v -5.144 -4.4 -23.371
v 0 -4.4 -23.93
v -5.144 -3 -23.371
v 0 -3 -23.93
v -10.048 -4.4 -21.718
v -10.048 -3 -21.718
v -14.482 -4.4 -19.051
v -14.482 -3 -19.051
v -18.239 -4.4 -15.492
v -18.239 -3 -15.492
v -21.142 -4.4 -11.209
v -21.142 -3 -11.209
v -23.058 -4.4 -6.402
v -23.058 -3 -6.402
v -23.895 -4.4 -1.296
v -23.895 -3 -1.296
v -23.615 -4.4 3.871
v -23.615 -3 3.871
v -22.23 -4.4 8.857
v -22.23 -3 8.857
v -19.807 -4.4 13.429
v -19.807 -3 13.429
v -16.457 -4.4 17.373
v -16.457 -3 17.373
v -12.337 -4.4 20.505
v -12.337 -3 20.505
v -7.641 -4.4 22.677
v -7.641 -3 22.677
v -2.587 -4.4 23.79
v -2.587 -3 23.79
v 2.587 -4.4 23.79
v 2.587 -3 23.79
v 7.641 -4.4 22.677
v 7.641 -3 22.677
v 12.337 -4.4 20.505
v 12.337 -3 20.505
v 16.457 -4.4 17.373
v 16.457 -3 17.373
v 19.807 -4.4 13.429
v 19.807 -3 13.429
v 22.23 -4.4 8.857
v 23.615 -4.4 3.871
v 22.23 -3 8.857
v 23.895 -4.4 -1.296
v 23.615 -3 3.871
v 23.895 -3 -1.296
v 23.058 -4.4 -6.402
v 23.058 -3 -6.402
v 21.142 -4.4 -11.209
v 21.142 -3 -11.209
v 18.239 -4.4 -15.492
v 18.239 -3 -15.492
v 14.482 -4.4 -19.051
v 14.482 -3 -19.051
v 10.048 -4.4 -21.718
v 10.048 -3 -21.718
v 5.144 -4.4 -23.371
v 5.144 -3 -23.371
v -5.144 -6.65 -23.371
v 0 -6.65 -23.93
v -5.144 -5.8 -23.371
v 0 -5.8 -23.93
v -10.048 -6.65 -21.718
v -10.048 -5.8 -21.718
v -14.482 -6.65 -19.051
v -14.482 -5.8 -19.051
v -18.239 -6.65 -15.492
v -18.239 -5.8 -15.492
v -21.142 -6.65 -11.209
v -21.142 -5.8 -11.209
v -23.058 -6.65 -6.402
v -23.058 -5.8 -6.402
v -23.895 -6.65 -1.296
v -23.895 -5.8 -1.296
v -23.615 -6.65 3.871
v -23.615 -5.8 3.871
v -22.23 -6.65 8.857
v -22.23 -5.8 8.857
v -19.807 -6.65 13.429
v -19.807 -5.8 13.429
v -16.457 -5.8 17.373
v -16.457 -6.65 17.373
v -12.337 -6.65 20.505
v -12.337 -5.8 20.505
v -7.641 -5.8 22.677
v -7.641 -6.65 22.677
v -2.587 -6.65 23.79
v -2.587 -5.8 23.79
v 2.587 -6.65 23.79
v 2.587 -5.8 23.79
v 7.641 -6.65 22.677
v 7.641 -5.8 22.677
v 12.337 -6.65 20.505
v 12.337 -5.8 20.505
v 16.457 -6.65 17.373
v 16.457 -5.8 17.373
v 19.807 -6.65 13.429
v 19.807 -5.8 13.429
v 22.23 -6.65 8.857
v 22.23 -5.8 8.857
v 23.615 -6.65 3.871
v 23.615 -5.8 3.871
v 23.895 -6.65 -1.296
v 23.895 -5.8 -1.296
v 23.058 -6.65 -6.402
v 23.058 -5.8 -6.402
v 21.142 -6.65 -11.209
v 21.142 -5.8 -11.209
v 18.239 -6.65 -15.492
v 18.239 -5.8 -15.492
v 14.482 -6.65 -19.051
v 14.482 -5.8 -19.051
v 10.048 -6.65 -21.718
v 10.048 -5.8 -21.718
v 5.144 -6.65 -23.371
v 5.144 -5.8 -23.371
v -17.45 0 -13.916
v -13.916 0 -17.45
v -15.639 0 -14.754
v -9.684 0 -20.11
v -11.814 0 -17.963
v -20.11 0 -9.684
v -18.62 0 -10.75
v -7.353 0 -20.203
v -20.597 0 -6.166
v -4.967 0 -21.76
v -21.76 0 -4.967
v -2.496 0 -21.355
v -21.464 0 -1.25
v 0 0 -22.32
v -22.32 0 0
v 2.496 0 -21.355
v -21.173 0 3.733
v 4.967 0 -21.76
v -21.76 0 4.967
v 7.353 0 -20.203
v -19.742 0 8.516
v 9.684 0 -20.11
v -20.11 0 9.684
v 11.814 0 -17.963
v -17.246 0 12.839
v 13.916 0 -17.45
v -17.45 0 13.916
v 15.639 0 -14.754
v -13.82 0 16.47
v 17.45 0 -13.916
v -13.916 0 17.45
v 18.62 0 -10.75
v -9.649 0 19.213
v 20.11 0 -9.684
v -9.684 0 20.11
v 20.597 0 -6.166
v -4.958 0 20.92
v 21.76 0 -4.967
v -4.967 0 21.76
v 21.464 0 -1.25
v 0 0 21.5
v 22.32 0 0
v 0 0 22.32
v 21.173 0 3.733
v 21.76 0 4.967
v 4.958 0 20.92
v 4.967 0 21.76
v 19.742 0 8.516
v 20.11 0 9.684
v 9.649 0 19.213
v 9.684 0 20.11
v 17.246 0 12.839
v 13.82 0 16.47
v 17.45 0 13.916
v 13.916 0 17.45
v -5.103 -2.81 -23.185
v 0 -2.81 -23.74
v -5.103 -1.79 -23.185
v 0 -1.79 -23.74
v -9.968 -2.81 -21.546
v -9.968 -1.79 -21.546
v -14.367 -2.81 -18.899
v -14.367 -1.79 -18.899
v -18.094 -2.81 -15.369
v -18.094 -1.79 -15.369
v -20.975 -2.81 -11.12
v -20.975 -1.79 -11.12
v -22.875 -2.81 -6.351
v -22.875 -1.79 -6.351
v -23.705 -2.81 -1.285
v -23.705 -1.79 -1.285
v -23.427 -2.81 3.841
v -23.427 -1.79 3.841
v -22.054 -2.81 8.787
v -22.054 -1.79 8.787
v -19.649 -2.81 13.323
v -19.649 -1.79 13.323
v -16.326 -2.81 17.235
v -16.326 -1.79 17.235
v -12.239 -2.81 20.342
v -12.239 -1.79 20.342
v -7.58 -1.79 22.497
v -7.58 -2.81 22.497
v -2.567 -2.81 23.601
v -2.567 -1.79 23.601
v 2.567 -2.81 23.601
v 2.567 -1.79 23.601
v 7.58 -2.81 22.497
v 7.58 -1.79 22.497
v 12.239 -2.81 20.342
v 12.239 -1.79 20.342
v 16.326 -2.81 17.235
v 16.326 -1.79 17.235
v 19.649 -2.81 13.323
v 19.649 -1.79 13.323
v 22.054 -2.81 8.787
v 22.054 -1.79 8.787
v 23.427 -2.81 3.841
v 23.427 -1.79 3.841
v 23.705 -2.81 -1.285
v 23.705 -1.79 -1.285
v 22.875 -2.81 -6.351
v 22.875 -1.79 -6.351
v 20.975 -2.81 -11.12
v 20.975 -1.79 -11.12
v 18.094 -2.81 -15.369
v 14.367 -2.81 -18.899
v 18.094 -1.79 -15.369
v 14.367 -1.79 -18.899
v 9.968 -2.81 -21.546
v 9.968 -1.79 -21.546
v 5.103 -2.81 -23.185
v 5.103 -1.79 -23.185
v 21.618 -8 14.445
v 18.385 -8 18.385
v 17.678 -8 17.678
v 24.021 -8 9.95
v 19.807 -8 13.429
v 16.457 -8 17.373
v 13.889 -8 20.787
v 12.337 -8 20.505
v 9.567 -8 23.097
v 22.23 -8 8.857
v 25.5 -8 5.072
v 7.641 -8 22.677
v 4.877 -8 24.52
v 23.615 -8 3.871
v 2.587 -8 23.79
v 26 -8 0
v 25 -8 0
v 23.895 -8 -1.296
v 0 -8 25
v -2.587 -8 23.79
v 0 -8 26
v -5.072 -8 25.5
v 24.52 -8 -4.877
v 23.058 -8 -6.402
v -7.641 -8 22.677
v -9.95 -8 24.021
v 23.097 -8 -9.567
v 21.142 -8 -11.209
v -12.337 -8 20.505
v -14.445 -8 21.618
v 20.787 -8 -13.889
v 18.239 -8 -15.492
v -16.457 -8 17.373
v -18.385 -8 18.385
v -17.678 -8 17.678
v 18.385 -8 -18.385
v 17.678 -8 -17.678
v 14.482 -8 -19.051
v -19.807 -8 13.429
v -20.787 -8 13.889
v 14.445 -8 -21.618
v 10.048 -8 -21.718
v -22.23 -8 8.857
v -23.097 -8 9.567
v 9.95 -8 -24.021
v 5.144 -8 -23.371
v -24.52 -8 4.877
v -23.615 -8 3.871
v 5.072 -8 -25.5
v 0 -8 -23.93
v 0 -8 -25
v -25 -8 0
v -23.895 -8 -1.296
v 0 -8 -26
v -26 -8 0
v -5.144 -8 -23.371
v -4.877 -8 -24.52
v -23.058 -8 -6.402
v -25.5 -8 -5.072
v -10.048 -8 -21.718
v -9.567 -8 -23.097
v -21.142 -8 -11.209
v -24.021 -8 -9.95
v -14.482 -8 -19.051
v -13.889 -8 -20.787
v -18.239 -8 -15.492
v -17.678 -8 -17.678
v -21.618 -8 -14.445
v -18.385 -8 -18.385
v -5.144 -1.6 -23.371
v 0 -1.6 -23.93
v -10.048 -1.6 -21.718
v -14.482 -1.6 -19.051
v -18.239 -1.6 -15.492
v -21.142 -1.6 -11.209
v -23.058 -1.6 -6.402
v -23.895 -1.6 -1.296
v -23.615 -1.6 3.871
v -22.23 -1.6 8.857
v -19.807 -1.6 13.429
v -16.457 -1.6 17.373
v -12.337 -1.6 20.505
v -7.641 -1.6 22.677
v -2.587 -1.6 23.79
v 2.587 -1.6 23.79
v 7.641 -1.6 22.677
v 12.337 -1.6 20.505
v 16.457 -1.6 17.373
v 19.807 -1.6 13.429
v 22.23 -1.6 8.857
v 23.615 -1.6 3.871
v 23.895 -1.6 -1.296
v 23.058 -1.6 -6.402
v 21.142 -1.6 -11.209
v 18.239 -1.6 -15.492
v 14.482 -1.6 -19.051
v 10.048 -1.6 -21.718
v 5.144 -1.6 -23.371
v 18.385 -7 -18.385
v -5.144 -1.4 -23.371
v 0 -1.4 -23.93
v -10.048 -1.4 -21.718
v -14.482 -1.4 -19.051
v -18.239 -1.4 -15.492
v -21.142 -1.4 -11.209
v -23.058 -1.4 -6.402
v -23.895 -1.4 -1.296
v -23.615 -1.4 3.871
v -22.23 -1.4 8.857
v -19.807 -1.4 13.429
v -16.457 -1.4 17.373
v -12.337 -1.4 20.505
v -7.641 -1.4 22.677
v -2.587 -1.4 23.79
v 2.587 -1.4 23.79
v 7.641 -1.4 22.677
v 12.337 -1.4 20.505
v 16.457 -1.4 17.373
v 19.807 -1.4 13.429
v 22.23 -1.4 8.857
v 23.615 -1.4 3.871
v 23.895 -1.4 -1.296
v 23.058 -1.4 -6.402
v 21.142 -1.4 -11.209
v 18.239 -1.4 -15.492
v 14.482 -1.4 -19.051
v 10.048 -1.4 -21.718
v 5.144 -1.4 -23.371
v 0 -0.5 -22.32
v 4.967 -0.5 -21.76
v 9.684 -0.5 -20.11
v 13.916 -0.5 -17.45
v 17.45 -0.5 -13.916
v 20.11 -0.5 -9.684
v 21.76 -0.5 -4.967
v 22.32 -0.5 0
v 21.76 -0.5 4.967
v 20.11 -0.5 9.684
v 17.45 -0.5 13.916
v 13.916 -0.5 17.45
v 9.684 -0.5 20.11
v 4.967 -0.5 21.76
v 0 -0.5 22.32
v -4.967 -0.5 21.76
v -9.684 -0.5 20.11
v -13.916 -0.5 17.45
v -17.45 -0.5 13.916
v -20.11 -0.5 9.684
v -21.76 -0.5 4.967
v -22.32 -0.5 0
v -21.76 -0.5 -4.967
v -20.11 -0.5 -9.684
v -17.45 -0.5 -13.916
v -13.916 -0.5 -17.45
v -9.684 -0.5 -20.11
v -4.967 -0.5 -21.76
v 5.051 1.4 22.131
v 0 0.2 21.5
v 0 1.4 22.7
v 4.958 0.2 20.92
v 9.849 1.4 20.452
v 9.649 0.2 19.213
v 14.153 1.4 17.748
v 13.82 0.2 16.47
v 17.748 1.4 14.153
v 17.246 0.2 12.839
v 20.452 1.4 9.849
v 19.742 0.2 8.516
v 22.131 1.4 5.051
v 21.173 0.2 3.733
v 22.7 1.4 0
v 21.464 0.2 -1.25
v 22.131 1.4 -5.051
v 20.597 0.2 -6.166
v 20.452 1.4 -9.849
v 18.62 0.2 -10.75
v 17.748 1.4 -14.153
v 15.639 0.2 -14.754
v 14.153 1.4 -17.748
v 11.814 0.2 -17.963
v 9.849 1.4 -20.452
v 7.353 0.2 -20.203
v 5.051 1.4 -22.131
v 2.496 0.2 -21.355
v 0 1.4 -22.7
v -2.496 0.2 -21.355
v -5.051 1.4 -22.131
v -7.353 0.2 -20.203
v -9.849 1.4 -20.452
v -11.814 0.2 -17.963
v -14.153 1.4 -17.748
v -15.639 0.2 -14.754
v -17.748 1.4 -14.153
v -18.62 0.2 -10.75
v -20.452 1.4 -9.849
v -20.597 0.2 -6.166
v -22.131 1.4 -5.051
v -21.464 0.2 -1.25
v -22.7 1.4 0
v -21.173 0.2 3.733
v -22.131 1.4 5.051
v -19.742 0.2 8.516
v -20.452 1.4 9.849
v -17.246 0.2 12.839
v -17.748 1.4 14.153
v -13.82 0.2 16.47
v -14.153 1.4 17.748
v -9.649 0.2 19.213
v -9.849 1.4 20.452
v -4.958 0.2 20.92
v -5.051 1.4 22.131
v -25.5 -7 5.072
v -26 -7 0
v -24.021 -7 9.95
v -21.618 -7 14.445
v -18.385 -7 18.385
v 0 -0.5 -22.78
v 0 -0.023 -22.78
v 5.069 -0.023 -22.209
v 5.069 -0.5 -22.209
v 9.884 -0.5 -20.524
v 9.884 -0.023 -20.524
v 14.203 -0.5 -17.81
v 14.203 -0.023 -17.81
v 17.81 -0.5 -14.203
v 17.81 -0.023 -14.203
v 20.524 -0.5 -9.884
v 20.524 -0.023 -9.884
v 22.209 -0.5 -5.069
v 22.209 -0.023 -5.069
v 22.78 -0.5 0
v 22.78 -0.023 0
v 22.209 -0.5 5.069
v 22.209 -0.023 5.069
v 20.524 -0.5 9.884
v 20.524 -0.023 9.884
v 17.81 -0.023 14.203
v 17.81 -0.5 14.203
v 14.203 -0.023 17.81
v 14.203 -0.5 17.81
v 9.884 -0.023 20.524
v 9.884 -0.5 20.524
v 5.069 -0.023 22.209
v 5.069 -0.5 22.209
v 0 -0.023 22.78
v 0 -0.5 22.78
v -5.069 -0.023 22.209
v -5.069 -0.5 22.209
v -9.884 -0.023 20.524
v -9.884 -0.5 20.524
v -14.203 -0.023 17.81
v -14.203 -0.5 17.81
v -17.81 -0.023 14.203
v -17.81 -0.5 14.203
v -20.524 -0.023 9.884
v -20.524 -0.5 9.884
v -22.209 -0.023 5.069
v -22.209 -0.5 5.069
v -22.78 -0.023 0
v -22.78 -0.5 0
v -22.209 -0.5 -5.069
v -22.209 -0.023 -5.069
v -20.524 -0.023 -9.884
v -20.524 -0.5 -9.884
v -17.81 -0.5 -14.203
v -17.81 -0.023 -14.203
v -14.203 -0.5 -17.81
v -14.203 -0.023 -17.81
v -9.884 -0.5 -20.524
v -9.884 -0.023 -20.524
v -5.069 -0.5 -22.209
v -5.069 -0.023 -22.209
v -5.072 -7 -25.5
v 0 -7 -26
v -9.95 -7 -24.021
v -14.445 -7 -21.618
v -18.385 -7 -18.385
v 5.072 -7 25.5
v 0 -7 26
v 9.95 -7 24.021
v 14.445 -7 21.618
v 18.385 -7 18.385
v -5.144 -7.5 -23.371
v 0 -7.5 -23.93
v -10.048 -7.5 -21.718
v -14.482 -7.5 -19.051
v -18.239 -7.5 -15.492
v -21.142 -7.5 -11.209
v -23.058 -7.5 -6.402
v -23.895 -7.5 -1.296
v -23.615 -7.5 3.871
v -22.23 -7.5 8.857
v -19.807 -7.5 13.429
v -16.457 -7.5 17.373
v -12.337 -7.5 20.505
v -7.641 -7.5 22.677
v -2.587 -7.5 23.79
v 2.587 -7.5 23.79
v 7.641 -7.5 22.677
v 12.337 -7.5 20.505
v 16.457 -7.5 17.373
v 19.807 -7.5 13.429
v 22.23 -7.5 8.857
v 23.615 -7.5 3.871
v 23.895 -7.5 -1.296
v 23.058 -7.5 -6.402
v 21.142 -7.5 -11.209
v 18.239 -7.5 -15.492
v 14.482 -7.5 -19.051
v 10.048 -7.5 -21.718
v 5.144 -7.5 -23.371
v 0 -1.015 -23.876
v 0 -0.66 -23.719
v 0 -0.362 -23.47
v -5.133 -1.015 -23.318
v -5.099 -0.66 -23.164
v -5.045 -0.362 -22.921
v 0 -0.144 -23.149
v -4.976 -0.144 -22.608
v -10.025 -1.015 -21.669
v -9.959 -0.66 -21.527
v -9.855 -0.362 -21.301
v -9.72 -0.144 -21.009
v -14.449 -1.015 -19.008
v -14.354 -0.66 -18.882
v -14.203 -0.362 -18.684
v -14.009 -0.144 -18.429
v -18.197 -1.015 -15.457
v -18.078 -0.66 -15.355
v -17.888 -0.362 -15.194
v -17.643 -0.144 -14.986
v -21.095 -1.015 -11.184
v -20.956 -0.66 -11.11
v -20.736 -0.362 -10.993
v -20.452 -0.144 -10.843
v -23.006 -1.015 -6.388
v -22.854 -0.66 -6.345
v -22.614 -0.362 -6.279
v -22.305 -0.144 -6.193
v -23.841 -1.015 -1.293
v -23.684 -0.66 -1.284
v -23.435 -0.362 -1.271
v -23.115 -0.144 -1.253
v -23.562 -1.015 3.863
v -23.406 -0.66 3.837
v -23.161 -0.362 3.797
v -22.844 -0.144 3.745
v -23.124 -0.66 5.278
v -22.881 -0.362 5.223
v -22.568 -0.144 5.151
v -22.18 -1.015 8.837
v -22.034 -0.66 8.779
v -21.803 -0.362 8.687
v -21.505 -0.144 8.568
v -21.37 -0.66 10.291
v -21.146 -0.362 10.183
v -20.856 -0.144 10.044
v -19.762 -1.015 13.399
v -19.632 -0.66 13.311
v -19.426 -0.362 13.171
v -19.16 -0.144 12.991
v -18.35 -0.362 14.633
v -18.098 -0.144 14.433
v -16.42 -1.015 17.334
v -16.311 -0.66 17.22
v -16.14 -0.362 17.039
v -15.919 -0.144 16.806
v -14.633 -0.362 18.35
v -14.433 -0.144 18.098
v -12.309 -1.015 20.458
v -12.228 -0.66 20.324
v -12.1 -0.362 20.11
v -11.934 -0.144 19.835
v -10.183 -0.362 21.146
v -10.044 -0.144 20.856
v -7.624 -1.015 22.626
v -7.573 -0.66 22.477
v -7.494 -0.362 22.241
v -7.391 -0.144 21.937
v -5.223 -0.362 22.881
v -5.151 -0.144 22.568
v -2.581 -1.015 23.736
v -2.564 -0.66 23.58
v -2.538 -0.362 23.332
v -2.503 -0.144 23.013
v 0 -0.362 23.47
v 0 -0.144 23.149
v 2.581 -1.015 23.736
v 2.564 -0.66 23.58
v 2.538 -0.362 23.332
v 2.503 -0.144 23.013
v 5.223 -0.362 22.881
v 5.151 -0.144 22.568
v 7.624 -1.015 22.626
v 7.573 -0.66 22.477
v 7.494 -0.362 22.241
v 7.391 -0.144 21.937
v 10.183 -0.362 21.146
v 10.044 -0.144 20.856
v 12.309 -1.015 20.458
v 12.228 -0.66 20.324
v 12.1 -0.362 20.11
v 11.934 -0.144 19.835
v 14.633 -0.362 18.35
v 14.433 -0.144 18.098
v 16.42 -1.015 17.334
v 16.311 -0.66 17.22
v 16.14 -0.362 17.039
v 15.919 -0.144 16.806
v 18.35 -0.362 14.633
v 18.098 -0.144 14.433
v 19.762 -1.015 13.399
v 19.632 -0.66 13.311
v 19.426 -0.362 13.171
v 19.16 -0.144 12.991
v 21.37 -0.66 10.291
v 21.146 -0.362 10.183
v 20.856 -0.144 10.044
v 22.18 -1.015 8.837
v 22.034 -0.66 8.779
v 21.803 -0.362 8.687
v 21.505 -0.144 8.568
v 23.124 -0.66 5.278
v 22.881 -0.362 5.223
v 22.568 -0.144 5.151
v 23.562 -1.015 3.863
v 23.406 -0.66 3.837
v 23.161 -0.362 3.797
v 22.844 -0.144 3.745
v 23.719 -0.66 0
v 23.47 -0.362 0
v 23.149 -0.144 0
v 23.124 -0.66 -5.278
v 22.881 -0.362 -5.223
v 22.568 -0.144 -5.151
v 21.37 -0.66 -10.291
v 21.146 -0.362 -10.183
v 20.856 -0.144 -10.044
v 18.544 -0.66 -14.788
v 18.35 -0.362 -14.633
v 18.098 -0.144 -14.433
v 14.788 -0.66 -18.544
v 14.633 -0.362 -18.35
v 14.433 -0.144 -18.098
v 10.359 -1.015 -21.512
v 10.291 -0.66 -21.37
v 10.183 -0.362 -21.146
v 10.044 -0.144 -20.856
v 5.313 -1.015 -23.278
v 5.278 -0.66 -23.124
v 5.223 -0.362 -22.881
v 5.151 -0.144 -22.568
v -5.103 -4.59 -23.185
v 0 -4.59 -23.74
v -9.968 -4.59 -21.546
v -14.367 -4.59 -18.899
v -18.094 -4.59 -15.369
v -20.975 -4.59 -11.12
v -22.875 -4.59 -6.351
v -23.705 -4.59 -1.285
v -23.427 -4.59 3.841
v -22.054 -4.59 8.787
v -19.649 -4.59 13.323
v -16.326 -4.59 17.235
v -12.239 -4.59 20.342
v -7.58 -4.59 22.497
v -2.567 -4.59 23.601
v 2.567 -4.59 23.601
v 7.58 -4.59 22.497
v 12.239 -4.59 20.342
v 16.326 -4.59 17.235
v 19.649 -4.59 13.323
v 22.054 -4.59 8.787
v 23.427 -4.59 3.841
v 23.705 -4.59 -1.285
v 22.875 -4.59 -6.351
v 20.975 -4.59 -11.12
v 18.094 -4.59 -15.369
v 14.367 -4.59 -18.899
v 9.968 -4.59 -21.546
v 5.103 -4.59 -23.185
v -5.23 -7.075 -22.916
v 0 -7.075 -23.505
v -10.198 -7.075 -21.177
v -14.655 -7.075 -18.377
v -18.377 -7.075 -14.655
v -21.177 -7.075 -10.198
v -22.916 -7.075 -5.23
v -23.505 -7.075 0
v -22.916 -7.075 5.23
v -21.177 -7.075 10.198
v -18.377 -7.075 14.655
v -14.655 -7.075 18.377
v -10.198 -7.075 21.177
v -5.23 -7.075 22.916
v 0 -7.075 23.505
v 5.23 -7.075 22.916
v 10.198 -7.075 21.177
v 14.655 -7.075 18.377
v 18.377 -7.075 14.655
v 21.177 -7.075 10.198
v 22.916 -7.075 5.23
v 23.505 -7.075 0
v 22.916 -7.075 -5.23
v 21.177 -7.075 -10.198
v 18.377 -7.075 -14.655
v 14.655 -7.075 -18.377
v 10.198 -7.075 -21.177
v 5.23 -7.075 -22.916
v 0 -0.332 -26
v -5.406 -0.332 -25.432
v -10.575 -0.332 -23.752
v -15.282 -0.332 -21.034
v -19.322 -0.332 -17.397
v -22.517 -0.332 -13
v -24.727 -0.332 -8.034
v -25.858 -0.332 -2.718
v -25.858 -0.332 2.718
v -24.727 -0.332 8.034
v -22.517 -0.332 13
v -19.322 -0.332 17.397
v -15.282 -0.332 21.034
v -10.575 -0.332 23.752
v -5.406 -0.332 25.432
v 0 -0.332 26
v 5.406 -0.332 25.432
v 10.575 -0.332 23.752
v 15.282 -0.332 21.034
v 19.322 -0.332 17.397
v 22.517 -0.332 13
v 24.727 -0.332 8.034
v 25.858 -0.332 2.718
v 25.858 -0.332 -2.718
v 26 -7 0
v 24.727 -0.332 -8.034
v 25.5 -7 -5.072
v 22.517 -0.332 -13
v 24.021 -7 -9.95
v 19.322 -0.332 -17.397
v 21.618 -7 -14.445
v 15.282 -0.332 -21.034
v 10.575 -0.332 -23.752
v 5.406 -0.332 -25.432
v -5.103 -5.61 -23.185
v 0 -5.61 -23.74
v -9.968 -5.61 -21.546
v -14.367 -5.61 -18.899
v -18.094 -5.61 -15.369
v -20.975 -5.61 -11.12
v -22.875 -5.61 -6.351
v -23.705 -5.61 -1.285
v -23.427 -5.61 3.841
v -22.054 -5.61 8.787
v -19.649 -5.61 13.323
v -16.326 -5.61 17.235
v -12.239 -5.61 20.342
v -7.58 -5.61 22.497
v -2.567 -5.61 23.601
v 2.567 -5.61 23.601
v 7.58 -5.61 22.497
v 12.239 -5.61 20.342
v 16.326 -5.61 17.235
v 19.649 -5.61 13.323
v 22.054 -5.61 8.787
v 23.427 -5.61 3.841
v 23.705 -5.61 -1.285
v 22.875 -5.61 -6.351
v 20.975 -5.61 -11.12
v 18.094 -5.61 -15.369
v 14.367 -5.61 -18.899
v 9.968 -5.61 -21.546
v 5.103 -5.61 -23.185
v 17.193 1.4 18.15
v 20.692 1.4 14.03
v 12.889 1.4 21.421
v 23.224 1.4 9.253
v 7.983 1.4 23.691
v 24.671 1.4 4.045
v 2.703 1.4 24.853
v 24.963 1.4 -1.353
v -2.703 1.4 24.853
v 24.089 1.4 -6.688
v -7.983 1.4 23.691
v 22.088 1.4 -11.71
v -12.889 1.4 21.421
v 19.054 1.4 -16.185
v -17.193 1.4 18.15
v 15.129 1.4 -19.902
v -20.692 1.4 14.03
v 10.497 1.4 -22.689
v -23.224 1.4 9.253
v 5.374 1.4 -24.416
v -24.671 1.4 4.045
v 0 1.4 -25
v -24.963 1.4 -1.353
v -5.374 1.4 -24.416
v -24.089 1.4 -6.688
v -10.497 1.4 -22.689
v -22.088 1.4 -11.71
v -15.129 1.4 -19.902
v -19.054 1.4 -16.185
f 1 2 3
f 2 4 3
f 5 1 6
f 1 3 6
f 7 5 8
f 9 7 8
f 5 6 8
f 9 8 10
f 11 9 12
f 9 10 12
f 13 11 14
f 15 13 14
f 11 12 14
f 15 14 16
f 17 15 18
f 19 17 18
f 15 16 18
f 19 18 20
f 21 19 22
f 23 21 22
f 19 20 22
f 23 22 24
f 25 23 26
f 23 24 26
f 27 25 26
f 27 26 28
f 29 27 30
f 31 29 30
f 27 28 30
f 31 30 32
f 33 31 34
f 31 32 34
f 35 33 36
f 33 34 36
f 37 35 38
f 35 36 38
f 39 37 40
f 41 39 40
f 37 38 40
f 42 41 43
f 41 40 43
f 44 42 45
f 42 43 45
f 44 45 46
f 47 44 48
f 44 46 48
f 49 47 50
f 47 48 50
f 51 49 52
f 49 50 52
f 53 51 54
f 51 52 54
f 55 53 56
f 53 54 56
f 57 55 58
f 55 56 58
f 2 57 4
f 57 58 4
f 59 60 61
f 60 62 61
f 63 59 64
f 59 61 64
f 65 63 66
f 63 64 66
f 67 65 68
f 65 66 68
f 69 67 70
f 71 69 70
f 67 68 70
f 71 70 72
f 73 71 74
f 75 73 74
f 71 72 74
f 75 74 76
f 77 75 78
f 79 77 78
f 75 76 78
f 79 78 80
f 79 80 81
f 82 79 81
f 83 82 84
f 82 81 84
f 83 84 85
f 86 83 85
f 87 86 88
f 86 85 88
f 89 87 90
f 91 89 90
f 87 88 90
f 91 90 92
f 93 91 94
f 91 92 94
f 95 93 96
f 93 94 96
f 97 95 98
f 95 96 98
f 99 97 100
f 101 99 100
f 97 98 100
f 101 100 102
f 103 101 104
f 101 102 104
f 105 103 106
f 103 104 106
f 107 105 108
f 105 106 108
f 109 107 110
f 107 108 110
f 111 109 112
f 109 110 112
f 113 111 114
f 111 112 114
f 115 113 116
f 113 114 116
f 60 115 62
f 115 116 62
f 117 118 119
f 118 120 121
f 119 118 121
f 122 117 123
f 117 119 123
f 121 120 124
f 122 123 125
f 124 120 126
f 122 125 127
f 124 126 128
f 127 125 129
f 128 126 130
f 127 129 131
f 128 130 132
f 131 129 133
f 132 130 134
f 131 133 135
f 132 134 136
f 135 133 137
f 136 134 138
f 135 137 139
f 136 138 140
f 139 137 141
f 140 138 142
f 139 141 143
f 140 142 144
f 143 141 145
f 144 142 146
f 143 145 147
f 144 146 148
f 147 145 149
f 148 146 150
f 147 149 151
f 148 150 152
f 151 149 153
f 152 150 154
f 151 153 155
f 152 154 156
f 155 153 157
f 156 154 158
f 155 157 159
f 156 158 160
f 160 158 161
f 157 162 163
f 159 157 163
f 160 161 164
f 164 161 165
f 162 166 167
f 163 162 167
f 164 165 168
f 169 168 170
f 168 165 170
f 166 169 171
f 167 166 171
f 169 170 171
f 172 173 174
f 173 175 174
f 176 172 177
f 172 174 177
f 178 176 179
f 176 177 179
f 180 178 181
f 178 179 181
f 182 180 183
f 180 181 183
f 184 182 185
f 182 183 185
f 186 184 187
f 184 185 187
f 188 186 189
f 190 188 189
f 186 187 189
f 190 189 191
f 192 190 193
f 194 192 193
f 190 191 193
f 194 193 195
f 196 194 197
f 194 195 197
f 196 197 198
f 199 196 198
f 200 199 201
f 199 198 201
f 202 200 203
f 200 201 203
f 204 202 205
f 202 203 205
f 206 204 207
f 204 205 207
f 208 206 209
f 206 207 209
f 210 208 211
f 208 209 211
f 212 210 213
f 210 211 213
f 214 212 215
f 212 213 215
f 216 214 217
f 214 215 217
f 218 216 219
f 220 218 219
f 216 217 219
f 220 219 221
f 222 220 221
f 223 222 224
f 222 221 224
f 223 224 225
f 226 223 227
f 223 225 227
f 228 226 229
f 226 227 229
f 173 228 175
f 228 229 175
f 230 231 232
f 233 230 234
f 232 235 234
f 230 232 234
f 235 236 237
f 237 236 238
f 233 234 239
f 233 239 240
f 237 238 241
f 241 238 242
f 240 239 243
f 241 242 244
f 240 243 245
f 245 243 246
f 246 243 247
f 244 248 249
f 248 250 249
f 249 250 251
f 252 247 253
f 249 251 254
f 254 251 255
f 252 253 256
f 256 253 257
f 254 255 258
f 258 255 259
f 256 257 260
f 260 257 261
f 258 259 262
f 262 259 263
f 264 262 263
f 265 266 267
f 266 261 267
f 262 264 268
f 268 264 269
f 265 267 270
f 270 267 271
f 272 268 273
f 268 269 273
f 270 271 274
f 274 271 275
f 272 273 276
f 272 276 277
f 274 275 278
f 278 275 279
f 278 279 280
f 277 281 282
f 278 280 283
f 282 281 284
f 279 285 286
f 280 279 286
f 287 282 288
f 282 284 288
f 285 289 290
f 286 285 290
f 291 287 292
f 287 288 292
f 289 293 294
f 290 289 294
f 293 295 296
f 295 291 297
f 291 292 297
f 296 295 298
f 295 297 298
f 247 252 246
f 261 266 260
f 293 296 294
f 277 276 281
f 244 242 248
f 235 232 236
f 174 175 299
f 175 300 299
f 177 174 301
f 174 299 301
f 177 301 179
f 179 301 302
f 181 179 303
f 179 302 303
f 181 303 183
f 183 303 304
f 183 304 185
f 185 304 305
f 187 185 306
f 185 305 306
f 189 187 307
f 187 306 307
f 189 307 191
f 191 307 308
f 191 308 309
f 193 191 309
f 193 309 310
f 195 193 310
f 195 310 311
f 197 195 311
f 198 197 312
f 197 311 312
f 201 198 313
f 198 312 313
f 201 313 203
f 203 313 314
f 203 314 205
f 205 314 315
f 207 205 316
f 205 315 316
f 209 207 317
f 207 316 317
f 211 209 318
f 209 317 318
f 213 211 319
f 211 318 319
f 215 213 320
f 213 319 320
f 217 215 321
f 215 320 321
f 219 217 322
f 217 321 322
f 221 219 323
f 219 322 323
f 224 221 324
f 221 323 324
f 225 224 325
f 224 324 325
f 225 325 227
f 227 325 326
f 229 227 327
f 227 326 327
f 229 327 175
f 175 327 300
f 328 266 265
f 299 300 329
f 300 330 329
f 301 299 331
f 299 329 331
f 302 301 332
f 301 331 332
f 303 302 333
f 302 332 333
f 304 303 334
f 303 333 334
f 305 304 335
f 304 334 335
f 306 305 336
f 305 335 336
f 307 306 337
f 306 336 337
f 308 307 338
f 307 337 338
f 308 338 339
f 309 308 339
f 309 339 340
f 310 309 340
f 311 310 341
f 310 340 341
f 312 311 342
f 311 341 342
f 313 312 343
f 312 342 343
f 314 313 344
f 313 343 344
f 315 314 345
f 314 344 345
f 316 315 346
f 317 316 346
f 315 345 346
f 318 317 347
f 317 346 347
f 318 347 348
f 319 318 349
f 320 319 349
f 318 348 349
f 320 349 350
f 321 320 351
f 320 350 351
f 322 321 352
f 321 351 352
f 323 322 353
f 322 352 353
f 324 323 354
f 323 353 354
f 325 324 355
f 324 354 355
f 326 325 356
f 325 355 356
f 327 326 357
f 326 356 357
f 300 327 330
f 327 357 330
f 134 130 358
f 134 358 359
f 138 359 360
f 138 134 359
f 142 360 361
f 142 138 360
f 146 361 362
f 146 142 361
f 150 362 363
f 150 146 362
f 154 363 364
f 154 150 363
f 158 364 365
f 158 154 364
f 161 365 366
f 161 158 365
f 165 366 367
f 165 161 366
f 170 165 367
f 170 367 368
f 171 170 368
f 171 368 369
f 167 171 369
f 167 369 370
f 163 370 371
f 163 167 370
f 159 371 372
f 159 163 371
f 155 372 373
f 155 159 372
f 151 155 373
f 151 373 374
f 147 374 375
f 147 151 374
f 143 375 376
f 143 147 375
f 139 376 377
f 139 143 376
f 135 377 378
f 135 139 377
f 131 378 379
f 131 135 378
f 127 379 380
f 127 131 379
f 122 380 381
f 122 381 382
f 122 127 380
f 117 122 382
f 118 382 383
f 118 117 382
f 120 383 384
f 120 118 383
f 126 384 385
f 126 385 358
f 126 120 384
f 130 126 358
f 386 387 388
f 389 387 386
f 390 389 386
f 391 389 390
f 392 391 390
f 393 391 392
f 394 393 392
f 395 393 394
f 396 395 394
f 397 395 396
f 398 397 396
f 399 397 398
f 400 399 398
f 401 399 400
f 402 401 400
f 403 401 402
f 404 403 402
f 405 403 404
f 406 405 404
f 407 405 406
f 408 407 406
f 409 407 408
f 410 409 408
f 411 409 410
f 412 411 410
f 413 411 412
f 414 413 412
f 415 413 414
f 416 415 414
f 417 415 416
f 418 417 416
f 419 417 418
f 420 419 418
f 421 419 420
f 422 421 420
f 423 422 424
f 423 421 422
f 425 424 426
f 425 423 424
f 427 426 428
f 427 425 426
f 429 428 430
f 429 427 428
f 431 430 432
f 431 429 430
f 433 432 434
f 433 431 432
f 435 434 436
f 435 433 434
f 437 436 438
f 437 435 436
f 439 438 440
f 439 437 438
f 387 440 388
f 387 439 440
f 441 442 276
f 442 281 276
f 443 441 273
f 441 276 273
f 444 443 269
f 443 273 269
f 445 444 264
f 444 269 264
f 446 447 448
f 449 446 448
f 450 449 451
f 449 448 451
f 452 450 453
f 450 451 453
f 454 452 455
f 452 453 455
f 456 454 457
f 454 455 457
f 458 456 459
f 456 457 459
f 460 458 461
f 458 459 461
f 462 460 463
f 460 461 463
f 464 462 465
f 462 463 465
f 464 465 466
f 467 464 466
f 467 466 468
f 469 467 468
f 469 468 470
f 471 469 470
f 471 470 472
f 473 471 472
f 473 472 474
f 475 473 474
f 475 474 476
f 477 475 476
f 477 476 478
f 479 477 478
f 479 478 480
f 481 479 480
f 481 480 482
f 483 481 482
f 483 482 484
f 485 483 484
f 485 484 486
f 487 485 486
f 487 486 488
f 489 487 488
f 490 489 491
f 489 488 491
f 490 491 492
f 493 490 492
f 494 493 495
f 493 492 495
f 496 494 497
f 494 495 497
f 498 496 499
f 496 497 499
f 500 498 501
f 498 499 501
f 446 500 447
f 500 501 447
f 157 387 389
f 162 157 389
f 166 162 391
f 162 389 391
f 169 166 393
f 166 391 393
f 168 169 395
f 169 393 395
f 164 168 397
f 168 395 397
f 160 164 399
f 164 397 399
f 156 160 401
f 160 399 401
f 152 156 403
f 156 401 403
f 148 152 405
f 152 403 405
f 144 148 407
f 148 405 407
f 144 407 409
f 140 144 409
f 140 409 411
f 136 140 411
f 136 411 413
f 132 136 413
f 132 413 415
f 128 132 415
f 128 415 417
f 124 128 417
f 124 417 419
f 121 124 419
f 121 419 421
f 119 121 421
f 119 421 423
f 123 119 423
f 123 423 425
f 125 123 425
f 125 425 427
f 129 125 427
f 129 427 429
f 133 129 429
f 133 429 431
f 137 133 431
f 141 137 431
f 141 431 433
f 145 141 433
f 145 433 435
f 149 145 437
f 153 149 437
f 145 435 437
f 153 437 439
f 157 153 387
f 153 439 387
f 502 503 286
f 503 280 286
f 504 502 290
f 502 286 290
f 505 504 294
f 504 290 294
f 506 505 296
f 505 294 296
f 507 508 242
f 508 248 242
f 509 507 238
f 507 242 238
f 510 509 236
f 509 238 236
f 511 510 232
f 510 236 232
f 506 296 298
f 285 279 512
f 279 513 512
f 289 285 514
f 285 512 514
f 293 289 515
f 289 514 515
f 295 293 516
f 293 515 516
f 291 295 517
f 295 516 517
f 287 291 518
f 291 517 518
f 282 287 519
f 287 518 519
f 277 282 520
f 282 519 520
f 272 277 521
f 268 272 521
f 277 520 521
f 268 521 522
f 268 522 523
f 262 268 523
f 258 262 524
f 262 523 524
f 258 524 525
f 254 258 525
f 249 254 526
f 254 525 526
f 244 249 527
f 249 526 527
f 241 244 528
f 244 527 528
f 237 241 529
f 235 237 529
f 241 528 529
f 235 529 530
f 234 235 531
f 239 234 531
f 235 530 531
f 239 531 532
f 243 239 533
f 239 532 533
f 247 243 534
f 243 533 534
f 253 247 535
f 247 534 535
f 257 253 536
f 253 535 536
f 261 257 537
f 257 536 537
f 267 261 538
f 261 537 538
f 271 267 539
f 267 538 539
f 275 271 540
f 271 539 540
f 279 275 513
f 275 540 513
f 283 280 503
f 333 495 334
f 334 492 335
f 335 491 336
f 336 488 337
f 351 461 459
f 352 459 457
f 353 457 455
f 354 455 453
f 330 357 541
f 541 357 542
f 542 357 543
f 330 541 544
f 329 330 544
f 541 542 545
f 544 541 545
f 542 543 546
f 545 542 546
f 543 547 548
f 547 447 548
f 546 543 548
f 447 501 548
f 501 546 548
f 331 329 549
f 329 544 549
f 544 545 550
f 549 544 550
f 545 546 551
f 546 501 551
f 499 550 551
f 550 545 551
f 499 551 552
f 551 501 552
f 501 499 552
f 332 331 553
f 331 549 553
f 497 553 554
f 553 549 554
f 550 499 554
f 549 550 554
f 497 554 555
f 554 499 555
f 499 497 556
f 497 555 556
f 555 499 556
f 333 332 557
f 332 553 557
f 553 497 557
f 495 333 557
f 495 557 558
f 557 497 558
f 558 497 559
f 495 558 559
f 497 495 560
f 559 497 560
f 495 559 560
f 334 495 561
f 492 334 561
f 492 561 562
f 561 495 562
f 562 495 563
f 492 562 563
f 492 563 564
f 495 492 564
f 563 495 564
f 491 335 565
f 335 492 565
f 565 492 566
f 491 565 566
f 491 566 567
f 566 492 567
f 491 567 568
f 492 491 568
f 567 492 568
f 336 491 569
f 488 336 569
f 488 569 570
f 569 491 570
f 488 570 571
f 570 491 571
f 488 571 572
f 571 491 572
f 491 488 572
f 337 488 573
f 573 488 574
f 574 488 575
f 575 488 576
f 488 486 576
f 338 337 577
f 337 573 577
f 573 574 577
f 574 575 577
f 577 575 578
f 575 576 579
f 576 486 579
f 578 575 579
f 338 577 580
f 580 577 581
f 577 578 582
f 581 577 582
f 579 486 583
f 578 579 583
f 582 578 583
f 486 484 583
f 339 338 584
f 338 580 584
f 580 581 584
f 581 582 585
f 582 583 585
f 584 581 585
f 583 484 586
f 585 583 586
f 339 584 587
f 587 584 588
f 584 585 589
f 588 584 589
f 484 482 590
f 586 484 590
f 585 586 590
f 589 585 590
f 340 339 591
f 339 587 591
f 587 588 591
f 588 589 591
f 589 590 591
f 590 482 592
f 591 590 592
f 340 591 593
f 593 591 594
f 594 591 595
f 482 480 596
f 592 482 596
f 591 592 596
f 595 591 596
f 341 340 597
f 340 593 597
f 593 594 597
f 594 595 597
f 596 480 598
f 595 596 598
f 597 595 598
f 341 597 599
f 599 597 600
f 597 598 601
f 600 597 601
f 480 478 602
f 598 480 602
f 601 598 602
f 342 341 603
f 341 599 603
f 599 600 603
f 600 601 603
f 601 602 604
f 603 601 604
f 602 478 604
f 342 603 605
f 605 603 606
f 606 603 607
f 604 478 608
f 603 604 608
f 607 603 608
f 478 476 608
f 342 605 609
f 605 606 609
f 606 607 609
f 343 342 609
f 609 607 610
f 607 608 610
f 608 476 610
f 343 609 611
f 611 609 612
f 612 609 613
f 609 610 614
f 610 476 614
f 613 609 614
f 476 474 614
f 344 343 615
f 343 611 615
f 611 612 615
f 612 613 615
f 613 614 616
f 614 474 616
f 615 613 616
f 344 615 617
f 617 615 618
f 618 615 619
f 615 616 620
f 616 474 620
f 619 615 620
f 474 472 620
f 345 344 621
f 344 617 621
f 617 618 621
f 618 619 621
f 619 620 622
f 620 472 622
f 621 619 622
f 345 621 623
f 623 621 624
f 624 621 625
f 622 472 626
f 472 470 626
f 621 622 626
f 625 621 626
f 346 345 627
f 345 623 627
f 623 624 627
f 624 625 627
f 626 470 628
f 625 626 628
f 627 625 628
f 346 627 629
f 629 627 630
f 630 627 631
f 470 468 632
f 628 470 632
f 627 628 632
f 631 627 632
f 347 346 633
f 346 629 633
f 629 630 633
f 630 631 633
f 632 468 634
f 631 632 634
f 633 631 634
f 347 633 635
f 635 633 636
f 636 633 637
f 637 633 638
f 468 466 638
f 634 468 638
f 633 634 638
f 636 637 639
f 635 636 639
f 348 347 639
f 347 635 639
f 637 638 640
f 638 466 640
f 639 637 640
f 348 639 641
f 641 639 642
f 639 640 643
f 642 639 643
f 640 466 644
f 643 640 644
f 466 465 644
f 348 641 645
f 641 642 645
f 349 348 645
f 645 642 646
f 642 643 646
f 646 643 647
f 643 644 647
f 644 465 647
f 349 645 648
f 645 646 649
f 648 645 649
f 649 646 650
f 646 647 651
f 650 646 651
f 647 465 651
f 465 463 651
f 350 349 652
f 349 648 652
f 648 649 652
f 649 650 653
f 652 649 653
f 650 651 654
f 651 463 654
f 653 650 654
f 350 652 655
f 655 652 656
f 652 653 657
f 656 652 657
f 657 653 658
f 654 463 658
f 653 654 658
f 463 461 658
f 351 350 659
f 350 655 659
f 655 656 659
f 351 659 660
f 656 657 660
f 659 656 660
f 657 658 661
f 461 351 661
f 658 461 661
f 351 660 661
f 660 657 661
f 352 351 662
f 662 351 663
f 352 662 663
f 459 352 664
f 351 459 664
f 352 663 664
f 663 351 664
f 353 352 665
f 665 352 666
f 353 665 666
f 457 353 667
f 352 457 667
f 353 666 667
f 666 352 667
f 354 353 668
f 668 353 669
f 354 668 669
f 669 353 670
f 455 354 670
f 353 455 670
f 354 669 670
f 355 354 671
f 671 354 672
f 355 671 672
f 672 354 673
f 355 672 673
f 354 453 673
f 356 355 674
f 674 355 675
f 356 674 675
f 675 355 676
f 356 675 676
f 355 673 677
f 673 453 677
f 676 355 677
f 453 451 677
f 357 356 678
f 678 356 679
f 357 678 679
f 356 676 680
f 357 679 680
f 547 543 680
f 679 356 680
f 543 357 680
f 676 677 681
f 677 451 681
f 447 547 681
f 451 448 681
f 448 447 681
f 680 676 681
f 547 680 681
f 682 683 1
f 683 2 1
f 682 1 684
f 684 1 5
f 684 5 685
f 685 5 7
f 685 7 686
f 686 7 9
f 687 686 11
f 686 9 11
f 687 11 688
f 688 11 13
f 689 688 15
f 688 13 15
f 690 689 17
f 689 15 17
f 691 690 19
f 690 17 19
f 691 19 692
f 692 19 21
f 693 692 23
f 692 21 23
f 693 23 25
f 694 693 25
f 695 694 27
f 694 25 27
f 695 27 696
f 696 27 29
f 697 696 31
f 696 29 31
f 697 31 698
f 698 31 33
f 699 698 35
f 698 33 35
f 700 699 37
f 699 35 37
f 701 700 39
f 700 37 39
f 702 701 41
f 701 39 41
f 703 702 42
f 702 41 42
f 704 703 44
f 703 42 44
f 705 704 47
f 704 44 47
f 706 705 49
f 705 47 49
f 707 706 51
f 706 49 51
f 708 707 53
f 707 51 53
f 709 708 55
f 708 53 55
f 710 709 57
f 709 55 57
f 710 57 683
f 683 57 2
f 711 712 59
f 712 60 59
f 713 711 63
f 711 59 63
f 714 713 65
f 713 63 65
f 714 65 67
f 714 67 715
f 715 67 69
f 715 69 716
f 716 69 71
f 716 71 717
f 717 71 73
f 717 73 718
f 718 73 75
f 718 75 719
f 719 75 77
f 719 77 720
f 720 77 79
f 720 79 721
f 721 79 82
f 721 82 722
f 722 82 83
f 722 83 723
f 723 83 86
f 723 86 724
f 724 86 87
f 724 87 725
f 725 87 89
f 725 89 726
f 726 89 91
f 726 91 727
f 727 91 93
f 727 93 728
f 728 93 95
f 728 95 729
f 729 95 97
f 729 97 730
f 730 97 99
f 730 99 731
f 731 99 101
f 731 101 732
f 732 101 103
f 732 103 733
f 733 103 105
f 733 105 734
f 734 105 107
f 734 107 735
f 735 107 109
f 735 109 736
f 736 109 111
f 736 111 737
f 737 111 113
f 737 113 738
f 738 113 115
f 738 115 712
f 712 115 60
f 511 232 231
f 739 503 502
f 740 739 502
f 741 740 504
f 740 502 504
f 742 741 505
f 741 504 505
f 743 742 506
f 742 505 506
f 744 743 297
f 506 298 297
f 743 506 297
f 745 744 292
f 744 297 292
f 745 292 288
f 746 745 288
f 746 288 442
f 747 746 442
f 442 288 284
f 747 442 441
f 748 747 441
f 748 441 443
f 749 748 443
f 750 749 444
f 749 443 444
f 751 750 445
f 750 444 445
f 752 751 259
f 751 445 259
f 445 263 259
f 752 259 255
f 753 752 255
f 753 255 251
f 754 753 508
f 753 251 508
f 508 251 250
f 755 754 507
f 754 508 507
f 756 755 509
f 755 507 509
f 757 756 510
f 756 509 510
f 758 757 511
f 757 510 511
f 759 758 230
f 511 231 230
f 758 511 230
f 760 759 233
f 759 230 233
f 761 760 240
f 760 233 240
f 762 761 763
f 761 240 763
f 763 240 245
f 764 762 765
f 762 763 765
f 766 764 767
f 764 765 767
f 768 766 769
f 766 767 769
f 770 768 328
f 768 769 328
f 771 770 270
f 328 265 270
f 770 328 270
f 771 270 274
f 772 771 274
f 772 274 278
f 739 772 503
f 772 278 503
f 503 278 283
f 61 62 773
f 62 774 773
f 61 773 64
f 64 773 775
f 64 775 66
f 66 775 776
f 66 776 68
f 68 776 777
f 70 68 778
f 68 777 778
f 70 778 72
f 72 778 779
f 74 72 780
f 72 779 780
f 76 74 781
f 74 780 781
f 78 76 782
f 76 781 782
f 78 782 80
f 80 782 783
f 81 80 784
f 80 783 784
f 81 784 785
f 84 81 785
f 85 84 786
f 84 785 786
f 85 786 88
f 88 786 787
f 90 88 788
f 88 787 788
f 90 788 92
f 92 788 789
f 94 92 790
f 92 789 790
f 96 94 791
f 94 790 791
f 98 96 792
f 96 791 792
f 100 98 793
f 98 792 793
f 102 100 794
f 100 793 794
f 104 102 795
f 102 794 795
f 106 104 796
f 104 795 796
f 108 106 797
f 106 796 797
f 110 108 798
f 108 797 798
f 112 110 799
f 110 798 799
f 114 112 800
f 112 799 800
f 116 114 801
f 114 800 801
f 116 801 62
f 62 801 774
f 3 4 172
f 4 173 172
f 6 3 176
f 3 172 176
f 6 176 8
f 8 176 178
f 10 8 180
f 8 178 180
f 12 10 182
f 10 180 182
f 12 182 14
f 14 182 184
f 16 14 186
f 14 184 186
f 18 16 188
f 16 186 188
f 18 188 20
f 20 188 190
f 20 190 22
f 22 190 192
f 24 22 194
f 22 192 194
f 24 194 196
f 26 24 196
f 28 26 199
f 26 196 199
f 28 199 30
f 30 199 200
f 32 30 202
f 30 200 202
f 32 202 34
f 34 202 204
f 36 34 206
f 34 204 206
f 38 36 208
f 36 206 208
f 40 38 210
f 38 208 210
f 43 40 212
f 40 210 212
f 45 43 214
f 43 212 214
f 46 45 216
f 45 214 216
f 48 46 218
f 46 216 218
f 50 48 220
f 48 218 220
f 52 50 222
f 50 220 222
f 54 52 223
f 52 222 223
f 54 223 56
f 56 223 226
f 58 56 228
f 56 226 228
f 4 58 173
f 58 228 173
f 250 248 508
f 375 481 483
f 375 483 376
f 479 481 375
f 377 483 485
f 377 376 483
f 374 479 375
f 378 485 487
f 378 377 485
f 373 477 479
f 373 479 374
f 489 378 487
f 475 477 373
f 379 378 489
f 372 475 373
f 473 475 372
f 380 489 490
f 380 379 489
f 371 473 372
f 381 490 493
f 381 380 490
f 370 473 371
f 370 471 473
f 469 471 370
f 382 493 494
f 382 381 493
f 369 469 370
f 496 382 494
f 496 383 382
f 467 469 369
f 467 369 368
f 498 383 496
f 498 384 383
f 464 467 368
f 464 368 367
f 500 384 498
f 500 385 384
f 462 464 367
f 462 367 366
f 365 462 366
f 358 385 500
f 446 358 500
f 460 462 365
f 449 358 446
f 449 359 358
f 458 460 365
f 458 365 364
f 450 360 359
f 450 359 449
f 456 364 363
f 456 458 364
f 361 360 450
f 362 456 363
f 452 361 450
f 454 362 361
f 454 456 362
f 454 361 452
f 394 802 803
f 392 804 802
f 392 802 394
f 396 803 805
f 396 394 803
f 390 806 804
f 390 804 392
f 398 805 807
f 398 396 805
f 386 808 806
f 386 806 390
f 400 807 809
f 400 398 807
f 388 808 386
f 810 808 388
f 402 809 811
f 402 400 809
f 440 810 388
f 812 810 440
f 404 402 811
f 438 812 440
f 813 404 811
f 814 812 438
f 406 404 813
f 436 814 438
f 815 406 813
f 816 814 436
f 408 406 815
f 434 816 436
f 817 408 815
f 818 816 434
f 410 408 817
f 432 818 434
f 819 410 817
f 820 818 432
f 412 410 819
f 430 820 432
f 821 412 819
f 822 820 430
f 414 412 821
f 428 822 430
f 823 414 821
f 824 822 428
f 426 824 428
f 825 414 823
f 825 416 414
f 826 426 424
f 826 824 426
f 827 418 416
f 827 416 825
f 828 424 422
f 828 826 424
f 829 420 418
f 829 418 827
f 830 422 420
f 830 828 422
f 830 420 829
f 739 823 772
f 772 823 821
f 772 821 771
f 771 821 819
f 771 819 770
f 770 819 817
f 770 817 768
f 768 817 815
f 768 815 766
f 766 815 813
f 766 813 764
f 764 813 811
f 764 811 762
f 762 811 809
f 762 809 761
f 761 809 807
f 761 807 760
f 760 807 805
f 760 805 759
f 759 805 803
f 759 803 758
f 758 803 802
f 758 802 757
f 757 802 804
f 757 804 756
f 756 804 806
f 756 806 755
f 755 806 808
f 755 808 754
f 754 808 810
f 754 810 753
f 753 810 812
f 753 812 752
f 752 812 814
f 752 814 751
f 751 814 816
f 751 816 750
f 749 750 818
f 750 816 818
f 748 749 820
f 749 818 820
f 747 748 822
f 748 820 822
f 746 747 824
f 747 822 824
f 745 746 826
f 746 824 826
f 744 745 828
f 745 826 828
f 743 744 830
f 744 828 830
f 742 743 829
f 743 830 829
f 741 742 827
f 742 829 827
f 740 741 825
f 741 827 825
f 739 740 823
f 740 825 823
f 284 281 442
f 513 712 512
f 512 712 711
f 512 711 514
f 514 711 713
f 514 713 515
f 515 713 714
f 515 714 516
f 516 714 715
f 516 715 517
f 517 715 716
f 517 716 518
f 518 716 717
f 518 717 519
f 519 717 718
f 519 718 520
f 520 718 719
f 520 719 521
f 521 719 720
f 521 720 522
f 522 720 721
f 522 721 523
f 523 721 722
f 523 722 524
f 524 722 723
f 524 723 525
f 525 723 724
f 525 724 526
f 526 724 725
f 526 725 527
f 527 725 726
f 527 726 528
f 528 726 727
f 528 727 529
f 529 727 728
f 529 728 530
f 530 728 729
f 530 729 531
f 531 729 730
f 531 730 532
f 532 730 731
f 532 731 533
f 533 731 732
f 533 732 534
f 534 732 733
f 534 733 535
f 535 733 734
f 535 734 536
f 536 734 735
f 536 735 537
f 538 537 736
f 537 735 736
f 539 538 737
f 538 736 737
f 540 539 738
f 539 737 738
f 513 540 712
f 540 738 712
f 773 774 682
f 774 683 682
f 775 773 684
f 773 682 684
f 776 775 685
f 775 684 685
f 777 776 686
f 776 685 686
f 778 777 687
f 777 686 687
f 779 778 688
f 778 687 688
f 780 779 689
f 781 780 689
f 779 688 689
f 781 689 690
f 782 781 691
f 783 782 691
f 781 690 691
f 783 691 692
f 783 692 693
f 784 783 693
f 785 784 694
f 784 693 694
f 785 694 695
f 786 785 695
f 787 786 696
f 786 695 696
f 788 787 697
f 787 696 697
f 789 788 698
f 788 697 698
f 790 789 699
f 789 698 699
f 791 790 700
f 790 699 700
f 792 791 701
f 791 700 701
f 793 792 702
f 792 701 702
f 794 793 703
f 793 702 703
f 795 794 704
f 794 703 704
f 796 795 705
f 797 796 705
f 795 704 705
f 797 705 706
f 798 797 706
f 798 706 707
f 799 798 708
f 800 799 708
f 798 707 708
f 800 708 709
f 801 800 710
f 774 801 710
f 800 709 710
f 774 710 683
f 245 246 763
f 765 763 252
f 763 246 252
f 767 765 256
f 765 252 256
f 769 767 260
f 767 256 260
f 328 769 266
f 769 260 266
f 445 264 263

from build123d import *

# Parameters (mm, degrees)
SKETCH_1_R               = 26
EXTRUDE_1_DEPTH          = 2
SKETCH_5_R               = 21.5
CUT_EXTRUDE_1_DEPTH      = 39.105117767
CUT_EXTRUDE_START        = -0.6
SKETCH_7_R               = 26
CUT_EXTRUDE_2_DEPTH      = 0.6
CHAMFER_1_SIZE           = 1.732
CHAMFER_1_SIZE2          = 0.999970666
CHAMFER_2_SIZE           = 1.2
CUT_REVOLVE_1_ANGLE      = 45
PATTERN_CIRCULAR_1_COUNT = 4
SKETCH_9_R               = 22.78
SKETCH_9_R_2             = 22.32
EXTRUDE_2_DEPTH          = 0.5


with BuildPart() as part:
    # 草图1 → 凸台-拉伸1 (new body)
    with BuildSketch(Plane(origin=(0, 0, 0), x_dir=(1, 0, 0), z_dir=(0, 1, 0))):
        with Locations(Location((0, 0, 0), (0, 0, 270))):
            Circle(SKETCH_1_R)
    extrude(amount=EXTRUDE_1_DEPTH)

    # 草图4 → 旋转1 (revolve)
    with BuildSketch(Plane(origin=(0, 0, 0), x_dir=(0.8660254037844574, 0, 0.4999999999999675), z_dir=(-0.4999999999999675, 0, 0.8660254037844574)), mode=Mode.PRIVATE) as revolve_1_sk:
        with BuildLine():
            Line((23.93, -8), (23.93, -7.5))
            Line((23.93, -7.5), (23.505, -7.075))
            Line((23.505, -7.075), (23.93, -6.65))
            Line((23.93, -6.65), (23.93, -5.8))
            Line((23.93, -5.8), (23.74, -5.61))
            Line((23.74, -5.61), (23.74, -4.59))
            Line((23.74, -4.59), (23.93, -4.4))
            Line((23.93, -4.4), (23.93, -3))
            Line((23.93, -3), (23.74, -2.81))
            Line((23.74, -2.81), (23.74, -1.79))
            Line((23.74, -1.79), (23.93, -1.6))
            Line((23.93, -1.6), (23.93, -1.4))
            ThreePointArc((23.93, -1.4), (23.519949494, -0.410050506), (22.53, 0))
            Line((22.53, 0), (26, 0))
            Line((26, 0), (26, -8))
            Line((26, -8), (23.93, -8))
        make_face()
    revolve(revolve_1_sk.sketch.rotate(Axis((0, 0, 0), (0, 1, 0)), 120), axis=Axis((0, 0, 0), (0, 1, 0)))

    # 草图5 → 切除-拉伸1 (cut, through all)
    with BuildSketch(Plane(origin=(0, 2, 0), x_dir=(1, 0, 0), z_dir=(0, 1, 0))):
        with Locations(Location((0, 0, 0), (0, 0, 270))):
            Circle(SKETCH_5_R)
    extrude(amount=-CUT_EXTRUDE_1_DEPTH, mode=Mode.SUBTRACT)

    # 草图7 → 切除-拉伸2 (cut)
    with BuildSketch(Plane(origin=(0, 2, 0), x_dir=(1, 0, 0), z_dir=(0, 1, 0)).offset(CUT_EXTRUDE_START)):
        with Locations(Location((0, 0, 0), (0, 0, 90))):
            Circle(SKETCH_7_R)
    extrude(amount=CUT_EXTRUDE_2_DEPTH, mode=Mode.SUBTRACT)

    # 倒角1
    chamfer_1_edges = [part.edges().sort_by_distance(p)[0] for p in [
        (0, 1.4, -26),
    ]]
    chamfer_1_side = [part.faces().sort_by_distance(p)[0] for p in [
        (26, -3.3, 0),
    ]]
    chamfer(chamfer_1_edges, length=CHAMFER_1_SIZE, length2=CHAMFER_1_SIZE2, reference=chamfer_1_side[0])

    # 倒角2
    chamfer_2_edges = [part.edges().sort_by_distance(p)[0] for p in [
        (0, 1.4, -21.5),
    ]]
    chamfer(chamfer_2_edges, length=CHAMFER_2_SIZE)

    # 草图8 → 切除-旋转1 (revolve, cut)
    with BuildSketch(Plane.XY):
        Polygon((26, -8), (26, -7), (25, -8), align=None)
    cut_revolve_1 = revolve(axis=Axis((0, 0, 0), (0, 1, 0)), revolution_arc=CUT_REVOLVE_1_ANGLE, mode=Mode.SUBTRACT)

    # 阵列(圆周)1: 切除-旋转1 ×4 about axis
    pattern_circular_1_axis = Axis((0, 0, 0), (0, 1, 0))
    for i in range(1, PATTERN_CIRCULAR_1_COUNT):
        add(cut_revolve_1.rotate(pattern_circular_1_axis, i * 360 / PATTERN_CIRCULAR_1_COUNT), mode=Mode.SUBTRACT)

    # 草图9 → 凸台-拉伸2 (add)
    with BuildSketch(Plane.XZ):
        with Locations(Location((0, 0, 0), (0, 0, 270))):
            Circle(SKETCH_9_R)
        with Locations(Location((0, 0, 0), (0, 0, 270))):
            Circle(SKETCH_9_R_2, mode=Mode.SUBTRACT)
    extrude(amount=EXTRUDE_2_DEPTH)


solid = part.part
